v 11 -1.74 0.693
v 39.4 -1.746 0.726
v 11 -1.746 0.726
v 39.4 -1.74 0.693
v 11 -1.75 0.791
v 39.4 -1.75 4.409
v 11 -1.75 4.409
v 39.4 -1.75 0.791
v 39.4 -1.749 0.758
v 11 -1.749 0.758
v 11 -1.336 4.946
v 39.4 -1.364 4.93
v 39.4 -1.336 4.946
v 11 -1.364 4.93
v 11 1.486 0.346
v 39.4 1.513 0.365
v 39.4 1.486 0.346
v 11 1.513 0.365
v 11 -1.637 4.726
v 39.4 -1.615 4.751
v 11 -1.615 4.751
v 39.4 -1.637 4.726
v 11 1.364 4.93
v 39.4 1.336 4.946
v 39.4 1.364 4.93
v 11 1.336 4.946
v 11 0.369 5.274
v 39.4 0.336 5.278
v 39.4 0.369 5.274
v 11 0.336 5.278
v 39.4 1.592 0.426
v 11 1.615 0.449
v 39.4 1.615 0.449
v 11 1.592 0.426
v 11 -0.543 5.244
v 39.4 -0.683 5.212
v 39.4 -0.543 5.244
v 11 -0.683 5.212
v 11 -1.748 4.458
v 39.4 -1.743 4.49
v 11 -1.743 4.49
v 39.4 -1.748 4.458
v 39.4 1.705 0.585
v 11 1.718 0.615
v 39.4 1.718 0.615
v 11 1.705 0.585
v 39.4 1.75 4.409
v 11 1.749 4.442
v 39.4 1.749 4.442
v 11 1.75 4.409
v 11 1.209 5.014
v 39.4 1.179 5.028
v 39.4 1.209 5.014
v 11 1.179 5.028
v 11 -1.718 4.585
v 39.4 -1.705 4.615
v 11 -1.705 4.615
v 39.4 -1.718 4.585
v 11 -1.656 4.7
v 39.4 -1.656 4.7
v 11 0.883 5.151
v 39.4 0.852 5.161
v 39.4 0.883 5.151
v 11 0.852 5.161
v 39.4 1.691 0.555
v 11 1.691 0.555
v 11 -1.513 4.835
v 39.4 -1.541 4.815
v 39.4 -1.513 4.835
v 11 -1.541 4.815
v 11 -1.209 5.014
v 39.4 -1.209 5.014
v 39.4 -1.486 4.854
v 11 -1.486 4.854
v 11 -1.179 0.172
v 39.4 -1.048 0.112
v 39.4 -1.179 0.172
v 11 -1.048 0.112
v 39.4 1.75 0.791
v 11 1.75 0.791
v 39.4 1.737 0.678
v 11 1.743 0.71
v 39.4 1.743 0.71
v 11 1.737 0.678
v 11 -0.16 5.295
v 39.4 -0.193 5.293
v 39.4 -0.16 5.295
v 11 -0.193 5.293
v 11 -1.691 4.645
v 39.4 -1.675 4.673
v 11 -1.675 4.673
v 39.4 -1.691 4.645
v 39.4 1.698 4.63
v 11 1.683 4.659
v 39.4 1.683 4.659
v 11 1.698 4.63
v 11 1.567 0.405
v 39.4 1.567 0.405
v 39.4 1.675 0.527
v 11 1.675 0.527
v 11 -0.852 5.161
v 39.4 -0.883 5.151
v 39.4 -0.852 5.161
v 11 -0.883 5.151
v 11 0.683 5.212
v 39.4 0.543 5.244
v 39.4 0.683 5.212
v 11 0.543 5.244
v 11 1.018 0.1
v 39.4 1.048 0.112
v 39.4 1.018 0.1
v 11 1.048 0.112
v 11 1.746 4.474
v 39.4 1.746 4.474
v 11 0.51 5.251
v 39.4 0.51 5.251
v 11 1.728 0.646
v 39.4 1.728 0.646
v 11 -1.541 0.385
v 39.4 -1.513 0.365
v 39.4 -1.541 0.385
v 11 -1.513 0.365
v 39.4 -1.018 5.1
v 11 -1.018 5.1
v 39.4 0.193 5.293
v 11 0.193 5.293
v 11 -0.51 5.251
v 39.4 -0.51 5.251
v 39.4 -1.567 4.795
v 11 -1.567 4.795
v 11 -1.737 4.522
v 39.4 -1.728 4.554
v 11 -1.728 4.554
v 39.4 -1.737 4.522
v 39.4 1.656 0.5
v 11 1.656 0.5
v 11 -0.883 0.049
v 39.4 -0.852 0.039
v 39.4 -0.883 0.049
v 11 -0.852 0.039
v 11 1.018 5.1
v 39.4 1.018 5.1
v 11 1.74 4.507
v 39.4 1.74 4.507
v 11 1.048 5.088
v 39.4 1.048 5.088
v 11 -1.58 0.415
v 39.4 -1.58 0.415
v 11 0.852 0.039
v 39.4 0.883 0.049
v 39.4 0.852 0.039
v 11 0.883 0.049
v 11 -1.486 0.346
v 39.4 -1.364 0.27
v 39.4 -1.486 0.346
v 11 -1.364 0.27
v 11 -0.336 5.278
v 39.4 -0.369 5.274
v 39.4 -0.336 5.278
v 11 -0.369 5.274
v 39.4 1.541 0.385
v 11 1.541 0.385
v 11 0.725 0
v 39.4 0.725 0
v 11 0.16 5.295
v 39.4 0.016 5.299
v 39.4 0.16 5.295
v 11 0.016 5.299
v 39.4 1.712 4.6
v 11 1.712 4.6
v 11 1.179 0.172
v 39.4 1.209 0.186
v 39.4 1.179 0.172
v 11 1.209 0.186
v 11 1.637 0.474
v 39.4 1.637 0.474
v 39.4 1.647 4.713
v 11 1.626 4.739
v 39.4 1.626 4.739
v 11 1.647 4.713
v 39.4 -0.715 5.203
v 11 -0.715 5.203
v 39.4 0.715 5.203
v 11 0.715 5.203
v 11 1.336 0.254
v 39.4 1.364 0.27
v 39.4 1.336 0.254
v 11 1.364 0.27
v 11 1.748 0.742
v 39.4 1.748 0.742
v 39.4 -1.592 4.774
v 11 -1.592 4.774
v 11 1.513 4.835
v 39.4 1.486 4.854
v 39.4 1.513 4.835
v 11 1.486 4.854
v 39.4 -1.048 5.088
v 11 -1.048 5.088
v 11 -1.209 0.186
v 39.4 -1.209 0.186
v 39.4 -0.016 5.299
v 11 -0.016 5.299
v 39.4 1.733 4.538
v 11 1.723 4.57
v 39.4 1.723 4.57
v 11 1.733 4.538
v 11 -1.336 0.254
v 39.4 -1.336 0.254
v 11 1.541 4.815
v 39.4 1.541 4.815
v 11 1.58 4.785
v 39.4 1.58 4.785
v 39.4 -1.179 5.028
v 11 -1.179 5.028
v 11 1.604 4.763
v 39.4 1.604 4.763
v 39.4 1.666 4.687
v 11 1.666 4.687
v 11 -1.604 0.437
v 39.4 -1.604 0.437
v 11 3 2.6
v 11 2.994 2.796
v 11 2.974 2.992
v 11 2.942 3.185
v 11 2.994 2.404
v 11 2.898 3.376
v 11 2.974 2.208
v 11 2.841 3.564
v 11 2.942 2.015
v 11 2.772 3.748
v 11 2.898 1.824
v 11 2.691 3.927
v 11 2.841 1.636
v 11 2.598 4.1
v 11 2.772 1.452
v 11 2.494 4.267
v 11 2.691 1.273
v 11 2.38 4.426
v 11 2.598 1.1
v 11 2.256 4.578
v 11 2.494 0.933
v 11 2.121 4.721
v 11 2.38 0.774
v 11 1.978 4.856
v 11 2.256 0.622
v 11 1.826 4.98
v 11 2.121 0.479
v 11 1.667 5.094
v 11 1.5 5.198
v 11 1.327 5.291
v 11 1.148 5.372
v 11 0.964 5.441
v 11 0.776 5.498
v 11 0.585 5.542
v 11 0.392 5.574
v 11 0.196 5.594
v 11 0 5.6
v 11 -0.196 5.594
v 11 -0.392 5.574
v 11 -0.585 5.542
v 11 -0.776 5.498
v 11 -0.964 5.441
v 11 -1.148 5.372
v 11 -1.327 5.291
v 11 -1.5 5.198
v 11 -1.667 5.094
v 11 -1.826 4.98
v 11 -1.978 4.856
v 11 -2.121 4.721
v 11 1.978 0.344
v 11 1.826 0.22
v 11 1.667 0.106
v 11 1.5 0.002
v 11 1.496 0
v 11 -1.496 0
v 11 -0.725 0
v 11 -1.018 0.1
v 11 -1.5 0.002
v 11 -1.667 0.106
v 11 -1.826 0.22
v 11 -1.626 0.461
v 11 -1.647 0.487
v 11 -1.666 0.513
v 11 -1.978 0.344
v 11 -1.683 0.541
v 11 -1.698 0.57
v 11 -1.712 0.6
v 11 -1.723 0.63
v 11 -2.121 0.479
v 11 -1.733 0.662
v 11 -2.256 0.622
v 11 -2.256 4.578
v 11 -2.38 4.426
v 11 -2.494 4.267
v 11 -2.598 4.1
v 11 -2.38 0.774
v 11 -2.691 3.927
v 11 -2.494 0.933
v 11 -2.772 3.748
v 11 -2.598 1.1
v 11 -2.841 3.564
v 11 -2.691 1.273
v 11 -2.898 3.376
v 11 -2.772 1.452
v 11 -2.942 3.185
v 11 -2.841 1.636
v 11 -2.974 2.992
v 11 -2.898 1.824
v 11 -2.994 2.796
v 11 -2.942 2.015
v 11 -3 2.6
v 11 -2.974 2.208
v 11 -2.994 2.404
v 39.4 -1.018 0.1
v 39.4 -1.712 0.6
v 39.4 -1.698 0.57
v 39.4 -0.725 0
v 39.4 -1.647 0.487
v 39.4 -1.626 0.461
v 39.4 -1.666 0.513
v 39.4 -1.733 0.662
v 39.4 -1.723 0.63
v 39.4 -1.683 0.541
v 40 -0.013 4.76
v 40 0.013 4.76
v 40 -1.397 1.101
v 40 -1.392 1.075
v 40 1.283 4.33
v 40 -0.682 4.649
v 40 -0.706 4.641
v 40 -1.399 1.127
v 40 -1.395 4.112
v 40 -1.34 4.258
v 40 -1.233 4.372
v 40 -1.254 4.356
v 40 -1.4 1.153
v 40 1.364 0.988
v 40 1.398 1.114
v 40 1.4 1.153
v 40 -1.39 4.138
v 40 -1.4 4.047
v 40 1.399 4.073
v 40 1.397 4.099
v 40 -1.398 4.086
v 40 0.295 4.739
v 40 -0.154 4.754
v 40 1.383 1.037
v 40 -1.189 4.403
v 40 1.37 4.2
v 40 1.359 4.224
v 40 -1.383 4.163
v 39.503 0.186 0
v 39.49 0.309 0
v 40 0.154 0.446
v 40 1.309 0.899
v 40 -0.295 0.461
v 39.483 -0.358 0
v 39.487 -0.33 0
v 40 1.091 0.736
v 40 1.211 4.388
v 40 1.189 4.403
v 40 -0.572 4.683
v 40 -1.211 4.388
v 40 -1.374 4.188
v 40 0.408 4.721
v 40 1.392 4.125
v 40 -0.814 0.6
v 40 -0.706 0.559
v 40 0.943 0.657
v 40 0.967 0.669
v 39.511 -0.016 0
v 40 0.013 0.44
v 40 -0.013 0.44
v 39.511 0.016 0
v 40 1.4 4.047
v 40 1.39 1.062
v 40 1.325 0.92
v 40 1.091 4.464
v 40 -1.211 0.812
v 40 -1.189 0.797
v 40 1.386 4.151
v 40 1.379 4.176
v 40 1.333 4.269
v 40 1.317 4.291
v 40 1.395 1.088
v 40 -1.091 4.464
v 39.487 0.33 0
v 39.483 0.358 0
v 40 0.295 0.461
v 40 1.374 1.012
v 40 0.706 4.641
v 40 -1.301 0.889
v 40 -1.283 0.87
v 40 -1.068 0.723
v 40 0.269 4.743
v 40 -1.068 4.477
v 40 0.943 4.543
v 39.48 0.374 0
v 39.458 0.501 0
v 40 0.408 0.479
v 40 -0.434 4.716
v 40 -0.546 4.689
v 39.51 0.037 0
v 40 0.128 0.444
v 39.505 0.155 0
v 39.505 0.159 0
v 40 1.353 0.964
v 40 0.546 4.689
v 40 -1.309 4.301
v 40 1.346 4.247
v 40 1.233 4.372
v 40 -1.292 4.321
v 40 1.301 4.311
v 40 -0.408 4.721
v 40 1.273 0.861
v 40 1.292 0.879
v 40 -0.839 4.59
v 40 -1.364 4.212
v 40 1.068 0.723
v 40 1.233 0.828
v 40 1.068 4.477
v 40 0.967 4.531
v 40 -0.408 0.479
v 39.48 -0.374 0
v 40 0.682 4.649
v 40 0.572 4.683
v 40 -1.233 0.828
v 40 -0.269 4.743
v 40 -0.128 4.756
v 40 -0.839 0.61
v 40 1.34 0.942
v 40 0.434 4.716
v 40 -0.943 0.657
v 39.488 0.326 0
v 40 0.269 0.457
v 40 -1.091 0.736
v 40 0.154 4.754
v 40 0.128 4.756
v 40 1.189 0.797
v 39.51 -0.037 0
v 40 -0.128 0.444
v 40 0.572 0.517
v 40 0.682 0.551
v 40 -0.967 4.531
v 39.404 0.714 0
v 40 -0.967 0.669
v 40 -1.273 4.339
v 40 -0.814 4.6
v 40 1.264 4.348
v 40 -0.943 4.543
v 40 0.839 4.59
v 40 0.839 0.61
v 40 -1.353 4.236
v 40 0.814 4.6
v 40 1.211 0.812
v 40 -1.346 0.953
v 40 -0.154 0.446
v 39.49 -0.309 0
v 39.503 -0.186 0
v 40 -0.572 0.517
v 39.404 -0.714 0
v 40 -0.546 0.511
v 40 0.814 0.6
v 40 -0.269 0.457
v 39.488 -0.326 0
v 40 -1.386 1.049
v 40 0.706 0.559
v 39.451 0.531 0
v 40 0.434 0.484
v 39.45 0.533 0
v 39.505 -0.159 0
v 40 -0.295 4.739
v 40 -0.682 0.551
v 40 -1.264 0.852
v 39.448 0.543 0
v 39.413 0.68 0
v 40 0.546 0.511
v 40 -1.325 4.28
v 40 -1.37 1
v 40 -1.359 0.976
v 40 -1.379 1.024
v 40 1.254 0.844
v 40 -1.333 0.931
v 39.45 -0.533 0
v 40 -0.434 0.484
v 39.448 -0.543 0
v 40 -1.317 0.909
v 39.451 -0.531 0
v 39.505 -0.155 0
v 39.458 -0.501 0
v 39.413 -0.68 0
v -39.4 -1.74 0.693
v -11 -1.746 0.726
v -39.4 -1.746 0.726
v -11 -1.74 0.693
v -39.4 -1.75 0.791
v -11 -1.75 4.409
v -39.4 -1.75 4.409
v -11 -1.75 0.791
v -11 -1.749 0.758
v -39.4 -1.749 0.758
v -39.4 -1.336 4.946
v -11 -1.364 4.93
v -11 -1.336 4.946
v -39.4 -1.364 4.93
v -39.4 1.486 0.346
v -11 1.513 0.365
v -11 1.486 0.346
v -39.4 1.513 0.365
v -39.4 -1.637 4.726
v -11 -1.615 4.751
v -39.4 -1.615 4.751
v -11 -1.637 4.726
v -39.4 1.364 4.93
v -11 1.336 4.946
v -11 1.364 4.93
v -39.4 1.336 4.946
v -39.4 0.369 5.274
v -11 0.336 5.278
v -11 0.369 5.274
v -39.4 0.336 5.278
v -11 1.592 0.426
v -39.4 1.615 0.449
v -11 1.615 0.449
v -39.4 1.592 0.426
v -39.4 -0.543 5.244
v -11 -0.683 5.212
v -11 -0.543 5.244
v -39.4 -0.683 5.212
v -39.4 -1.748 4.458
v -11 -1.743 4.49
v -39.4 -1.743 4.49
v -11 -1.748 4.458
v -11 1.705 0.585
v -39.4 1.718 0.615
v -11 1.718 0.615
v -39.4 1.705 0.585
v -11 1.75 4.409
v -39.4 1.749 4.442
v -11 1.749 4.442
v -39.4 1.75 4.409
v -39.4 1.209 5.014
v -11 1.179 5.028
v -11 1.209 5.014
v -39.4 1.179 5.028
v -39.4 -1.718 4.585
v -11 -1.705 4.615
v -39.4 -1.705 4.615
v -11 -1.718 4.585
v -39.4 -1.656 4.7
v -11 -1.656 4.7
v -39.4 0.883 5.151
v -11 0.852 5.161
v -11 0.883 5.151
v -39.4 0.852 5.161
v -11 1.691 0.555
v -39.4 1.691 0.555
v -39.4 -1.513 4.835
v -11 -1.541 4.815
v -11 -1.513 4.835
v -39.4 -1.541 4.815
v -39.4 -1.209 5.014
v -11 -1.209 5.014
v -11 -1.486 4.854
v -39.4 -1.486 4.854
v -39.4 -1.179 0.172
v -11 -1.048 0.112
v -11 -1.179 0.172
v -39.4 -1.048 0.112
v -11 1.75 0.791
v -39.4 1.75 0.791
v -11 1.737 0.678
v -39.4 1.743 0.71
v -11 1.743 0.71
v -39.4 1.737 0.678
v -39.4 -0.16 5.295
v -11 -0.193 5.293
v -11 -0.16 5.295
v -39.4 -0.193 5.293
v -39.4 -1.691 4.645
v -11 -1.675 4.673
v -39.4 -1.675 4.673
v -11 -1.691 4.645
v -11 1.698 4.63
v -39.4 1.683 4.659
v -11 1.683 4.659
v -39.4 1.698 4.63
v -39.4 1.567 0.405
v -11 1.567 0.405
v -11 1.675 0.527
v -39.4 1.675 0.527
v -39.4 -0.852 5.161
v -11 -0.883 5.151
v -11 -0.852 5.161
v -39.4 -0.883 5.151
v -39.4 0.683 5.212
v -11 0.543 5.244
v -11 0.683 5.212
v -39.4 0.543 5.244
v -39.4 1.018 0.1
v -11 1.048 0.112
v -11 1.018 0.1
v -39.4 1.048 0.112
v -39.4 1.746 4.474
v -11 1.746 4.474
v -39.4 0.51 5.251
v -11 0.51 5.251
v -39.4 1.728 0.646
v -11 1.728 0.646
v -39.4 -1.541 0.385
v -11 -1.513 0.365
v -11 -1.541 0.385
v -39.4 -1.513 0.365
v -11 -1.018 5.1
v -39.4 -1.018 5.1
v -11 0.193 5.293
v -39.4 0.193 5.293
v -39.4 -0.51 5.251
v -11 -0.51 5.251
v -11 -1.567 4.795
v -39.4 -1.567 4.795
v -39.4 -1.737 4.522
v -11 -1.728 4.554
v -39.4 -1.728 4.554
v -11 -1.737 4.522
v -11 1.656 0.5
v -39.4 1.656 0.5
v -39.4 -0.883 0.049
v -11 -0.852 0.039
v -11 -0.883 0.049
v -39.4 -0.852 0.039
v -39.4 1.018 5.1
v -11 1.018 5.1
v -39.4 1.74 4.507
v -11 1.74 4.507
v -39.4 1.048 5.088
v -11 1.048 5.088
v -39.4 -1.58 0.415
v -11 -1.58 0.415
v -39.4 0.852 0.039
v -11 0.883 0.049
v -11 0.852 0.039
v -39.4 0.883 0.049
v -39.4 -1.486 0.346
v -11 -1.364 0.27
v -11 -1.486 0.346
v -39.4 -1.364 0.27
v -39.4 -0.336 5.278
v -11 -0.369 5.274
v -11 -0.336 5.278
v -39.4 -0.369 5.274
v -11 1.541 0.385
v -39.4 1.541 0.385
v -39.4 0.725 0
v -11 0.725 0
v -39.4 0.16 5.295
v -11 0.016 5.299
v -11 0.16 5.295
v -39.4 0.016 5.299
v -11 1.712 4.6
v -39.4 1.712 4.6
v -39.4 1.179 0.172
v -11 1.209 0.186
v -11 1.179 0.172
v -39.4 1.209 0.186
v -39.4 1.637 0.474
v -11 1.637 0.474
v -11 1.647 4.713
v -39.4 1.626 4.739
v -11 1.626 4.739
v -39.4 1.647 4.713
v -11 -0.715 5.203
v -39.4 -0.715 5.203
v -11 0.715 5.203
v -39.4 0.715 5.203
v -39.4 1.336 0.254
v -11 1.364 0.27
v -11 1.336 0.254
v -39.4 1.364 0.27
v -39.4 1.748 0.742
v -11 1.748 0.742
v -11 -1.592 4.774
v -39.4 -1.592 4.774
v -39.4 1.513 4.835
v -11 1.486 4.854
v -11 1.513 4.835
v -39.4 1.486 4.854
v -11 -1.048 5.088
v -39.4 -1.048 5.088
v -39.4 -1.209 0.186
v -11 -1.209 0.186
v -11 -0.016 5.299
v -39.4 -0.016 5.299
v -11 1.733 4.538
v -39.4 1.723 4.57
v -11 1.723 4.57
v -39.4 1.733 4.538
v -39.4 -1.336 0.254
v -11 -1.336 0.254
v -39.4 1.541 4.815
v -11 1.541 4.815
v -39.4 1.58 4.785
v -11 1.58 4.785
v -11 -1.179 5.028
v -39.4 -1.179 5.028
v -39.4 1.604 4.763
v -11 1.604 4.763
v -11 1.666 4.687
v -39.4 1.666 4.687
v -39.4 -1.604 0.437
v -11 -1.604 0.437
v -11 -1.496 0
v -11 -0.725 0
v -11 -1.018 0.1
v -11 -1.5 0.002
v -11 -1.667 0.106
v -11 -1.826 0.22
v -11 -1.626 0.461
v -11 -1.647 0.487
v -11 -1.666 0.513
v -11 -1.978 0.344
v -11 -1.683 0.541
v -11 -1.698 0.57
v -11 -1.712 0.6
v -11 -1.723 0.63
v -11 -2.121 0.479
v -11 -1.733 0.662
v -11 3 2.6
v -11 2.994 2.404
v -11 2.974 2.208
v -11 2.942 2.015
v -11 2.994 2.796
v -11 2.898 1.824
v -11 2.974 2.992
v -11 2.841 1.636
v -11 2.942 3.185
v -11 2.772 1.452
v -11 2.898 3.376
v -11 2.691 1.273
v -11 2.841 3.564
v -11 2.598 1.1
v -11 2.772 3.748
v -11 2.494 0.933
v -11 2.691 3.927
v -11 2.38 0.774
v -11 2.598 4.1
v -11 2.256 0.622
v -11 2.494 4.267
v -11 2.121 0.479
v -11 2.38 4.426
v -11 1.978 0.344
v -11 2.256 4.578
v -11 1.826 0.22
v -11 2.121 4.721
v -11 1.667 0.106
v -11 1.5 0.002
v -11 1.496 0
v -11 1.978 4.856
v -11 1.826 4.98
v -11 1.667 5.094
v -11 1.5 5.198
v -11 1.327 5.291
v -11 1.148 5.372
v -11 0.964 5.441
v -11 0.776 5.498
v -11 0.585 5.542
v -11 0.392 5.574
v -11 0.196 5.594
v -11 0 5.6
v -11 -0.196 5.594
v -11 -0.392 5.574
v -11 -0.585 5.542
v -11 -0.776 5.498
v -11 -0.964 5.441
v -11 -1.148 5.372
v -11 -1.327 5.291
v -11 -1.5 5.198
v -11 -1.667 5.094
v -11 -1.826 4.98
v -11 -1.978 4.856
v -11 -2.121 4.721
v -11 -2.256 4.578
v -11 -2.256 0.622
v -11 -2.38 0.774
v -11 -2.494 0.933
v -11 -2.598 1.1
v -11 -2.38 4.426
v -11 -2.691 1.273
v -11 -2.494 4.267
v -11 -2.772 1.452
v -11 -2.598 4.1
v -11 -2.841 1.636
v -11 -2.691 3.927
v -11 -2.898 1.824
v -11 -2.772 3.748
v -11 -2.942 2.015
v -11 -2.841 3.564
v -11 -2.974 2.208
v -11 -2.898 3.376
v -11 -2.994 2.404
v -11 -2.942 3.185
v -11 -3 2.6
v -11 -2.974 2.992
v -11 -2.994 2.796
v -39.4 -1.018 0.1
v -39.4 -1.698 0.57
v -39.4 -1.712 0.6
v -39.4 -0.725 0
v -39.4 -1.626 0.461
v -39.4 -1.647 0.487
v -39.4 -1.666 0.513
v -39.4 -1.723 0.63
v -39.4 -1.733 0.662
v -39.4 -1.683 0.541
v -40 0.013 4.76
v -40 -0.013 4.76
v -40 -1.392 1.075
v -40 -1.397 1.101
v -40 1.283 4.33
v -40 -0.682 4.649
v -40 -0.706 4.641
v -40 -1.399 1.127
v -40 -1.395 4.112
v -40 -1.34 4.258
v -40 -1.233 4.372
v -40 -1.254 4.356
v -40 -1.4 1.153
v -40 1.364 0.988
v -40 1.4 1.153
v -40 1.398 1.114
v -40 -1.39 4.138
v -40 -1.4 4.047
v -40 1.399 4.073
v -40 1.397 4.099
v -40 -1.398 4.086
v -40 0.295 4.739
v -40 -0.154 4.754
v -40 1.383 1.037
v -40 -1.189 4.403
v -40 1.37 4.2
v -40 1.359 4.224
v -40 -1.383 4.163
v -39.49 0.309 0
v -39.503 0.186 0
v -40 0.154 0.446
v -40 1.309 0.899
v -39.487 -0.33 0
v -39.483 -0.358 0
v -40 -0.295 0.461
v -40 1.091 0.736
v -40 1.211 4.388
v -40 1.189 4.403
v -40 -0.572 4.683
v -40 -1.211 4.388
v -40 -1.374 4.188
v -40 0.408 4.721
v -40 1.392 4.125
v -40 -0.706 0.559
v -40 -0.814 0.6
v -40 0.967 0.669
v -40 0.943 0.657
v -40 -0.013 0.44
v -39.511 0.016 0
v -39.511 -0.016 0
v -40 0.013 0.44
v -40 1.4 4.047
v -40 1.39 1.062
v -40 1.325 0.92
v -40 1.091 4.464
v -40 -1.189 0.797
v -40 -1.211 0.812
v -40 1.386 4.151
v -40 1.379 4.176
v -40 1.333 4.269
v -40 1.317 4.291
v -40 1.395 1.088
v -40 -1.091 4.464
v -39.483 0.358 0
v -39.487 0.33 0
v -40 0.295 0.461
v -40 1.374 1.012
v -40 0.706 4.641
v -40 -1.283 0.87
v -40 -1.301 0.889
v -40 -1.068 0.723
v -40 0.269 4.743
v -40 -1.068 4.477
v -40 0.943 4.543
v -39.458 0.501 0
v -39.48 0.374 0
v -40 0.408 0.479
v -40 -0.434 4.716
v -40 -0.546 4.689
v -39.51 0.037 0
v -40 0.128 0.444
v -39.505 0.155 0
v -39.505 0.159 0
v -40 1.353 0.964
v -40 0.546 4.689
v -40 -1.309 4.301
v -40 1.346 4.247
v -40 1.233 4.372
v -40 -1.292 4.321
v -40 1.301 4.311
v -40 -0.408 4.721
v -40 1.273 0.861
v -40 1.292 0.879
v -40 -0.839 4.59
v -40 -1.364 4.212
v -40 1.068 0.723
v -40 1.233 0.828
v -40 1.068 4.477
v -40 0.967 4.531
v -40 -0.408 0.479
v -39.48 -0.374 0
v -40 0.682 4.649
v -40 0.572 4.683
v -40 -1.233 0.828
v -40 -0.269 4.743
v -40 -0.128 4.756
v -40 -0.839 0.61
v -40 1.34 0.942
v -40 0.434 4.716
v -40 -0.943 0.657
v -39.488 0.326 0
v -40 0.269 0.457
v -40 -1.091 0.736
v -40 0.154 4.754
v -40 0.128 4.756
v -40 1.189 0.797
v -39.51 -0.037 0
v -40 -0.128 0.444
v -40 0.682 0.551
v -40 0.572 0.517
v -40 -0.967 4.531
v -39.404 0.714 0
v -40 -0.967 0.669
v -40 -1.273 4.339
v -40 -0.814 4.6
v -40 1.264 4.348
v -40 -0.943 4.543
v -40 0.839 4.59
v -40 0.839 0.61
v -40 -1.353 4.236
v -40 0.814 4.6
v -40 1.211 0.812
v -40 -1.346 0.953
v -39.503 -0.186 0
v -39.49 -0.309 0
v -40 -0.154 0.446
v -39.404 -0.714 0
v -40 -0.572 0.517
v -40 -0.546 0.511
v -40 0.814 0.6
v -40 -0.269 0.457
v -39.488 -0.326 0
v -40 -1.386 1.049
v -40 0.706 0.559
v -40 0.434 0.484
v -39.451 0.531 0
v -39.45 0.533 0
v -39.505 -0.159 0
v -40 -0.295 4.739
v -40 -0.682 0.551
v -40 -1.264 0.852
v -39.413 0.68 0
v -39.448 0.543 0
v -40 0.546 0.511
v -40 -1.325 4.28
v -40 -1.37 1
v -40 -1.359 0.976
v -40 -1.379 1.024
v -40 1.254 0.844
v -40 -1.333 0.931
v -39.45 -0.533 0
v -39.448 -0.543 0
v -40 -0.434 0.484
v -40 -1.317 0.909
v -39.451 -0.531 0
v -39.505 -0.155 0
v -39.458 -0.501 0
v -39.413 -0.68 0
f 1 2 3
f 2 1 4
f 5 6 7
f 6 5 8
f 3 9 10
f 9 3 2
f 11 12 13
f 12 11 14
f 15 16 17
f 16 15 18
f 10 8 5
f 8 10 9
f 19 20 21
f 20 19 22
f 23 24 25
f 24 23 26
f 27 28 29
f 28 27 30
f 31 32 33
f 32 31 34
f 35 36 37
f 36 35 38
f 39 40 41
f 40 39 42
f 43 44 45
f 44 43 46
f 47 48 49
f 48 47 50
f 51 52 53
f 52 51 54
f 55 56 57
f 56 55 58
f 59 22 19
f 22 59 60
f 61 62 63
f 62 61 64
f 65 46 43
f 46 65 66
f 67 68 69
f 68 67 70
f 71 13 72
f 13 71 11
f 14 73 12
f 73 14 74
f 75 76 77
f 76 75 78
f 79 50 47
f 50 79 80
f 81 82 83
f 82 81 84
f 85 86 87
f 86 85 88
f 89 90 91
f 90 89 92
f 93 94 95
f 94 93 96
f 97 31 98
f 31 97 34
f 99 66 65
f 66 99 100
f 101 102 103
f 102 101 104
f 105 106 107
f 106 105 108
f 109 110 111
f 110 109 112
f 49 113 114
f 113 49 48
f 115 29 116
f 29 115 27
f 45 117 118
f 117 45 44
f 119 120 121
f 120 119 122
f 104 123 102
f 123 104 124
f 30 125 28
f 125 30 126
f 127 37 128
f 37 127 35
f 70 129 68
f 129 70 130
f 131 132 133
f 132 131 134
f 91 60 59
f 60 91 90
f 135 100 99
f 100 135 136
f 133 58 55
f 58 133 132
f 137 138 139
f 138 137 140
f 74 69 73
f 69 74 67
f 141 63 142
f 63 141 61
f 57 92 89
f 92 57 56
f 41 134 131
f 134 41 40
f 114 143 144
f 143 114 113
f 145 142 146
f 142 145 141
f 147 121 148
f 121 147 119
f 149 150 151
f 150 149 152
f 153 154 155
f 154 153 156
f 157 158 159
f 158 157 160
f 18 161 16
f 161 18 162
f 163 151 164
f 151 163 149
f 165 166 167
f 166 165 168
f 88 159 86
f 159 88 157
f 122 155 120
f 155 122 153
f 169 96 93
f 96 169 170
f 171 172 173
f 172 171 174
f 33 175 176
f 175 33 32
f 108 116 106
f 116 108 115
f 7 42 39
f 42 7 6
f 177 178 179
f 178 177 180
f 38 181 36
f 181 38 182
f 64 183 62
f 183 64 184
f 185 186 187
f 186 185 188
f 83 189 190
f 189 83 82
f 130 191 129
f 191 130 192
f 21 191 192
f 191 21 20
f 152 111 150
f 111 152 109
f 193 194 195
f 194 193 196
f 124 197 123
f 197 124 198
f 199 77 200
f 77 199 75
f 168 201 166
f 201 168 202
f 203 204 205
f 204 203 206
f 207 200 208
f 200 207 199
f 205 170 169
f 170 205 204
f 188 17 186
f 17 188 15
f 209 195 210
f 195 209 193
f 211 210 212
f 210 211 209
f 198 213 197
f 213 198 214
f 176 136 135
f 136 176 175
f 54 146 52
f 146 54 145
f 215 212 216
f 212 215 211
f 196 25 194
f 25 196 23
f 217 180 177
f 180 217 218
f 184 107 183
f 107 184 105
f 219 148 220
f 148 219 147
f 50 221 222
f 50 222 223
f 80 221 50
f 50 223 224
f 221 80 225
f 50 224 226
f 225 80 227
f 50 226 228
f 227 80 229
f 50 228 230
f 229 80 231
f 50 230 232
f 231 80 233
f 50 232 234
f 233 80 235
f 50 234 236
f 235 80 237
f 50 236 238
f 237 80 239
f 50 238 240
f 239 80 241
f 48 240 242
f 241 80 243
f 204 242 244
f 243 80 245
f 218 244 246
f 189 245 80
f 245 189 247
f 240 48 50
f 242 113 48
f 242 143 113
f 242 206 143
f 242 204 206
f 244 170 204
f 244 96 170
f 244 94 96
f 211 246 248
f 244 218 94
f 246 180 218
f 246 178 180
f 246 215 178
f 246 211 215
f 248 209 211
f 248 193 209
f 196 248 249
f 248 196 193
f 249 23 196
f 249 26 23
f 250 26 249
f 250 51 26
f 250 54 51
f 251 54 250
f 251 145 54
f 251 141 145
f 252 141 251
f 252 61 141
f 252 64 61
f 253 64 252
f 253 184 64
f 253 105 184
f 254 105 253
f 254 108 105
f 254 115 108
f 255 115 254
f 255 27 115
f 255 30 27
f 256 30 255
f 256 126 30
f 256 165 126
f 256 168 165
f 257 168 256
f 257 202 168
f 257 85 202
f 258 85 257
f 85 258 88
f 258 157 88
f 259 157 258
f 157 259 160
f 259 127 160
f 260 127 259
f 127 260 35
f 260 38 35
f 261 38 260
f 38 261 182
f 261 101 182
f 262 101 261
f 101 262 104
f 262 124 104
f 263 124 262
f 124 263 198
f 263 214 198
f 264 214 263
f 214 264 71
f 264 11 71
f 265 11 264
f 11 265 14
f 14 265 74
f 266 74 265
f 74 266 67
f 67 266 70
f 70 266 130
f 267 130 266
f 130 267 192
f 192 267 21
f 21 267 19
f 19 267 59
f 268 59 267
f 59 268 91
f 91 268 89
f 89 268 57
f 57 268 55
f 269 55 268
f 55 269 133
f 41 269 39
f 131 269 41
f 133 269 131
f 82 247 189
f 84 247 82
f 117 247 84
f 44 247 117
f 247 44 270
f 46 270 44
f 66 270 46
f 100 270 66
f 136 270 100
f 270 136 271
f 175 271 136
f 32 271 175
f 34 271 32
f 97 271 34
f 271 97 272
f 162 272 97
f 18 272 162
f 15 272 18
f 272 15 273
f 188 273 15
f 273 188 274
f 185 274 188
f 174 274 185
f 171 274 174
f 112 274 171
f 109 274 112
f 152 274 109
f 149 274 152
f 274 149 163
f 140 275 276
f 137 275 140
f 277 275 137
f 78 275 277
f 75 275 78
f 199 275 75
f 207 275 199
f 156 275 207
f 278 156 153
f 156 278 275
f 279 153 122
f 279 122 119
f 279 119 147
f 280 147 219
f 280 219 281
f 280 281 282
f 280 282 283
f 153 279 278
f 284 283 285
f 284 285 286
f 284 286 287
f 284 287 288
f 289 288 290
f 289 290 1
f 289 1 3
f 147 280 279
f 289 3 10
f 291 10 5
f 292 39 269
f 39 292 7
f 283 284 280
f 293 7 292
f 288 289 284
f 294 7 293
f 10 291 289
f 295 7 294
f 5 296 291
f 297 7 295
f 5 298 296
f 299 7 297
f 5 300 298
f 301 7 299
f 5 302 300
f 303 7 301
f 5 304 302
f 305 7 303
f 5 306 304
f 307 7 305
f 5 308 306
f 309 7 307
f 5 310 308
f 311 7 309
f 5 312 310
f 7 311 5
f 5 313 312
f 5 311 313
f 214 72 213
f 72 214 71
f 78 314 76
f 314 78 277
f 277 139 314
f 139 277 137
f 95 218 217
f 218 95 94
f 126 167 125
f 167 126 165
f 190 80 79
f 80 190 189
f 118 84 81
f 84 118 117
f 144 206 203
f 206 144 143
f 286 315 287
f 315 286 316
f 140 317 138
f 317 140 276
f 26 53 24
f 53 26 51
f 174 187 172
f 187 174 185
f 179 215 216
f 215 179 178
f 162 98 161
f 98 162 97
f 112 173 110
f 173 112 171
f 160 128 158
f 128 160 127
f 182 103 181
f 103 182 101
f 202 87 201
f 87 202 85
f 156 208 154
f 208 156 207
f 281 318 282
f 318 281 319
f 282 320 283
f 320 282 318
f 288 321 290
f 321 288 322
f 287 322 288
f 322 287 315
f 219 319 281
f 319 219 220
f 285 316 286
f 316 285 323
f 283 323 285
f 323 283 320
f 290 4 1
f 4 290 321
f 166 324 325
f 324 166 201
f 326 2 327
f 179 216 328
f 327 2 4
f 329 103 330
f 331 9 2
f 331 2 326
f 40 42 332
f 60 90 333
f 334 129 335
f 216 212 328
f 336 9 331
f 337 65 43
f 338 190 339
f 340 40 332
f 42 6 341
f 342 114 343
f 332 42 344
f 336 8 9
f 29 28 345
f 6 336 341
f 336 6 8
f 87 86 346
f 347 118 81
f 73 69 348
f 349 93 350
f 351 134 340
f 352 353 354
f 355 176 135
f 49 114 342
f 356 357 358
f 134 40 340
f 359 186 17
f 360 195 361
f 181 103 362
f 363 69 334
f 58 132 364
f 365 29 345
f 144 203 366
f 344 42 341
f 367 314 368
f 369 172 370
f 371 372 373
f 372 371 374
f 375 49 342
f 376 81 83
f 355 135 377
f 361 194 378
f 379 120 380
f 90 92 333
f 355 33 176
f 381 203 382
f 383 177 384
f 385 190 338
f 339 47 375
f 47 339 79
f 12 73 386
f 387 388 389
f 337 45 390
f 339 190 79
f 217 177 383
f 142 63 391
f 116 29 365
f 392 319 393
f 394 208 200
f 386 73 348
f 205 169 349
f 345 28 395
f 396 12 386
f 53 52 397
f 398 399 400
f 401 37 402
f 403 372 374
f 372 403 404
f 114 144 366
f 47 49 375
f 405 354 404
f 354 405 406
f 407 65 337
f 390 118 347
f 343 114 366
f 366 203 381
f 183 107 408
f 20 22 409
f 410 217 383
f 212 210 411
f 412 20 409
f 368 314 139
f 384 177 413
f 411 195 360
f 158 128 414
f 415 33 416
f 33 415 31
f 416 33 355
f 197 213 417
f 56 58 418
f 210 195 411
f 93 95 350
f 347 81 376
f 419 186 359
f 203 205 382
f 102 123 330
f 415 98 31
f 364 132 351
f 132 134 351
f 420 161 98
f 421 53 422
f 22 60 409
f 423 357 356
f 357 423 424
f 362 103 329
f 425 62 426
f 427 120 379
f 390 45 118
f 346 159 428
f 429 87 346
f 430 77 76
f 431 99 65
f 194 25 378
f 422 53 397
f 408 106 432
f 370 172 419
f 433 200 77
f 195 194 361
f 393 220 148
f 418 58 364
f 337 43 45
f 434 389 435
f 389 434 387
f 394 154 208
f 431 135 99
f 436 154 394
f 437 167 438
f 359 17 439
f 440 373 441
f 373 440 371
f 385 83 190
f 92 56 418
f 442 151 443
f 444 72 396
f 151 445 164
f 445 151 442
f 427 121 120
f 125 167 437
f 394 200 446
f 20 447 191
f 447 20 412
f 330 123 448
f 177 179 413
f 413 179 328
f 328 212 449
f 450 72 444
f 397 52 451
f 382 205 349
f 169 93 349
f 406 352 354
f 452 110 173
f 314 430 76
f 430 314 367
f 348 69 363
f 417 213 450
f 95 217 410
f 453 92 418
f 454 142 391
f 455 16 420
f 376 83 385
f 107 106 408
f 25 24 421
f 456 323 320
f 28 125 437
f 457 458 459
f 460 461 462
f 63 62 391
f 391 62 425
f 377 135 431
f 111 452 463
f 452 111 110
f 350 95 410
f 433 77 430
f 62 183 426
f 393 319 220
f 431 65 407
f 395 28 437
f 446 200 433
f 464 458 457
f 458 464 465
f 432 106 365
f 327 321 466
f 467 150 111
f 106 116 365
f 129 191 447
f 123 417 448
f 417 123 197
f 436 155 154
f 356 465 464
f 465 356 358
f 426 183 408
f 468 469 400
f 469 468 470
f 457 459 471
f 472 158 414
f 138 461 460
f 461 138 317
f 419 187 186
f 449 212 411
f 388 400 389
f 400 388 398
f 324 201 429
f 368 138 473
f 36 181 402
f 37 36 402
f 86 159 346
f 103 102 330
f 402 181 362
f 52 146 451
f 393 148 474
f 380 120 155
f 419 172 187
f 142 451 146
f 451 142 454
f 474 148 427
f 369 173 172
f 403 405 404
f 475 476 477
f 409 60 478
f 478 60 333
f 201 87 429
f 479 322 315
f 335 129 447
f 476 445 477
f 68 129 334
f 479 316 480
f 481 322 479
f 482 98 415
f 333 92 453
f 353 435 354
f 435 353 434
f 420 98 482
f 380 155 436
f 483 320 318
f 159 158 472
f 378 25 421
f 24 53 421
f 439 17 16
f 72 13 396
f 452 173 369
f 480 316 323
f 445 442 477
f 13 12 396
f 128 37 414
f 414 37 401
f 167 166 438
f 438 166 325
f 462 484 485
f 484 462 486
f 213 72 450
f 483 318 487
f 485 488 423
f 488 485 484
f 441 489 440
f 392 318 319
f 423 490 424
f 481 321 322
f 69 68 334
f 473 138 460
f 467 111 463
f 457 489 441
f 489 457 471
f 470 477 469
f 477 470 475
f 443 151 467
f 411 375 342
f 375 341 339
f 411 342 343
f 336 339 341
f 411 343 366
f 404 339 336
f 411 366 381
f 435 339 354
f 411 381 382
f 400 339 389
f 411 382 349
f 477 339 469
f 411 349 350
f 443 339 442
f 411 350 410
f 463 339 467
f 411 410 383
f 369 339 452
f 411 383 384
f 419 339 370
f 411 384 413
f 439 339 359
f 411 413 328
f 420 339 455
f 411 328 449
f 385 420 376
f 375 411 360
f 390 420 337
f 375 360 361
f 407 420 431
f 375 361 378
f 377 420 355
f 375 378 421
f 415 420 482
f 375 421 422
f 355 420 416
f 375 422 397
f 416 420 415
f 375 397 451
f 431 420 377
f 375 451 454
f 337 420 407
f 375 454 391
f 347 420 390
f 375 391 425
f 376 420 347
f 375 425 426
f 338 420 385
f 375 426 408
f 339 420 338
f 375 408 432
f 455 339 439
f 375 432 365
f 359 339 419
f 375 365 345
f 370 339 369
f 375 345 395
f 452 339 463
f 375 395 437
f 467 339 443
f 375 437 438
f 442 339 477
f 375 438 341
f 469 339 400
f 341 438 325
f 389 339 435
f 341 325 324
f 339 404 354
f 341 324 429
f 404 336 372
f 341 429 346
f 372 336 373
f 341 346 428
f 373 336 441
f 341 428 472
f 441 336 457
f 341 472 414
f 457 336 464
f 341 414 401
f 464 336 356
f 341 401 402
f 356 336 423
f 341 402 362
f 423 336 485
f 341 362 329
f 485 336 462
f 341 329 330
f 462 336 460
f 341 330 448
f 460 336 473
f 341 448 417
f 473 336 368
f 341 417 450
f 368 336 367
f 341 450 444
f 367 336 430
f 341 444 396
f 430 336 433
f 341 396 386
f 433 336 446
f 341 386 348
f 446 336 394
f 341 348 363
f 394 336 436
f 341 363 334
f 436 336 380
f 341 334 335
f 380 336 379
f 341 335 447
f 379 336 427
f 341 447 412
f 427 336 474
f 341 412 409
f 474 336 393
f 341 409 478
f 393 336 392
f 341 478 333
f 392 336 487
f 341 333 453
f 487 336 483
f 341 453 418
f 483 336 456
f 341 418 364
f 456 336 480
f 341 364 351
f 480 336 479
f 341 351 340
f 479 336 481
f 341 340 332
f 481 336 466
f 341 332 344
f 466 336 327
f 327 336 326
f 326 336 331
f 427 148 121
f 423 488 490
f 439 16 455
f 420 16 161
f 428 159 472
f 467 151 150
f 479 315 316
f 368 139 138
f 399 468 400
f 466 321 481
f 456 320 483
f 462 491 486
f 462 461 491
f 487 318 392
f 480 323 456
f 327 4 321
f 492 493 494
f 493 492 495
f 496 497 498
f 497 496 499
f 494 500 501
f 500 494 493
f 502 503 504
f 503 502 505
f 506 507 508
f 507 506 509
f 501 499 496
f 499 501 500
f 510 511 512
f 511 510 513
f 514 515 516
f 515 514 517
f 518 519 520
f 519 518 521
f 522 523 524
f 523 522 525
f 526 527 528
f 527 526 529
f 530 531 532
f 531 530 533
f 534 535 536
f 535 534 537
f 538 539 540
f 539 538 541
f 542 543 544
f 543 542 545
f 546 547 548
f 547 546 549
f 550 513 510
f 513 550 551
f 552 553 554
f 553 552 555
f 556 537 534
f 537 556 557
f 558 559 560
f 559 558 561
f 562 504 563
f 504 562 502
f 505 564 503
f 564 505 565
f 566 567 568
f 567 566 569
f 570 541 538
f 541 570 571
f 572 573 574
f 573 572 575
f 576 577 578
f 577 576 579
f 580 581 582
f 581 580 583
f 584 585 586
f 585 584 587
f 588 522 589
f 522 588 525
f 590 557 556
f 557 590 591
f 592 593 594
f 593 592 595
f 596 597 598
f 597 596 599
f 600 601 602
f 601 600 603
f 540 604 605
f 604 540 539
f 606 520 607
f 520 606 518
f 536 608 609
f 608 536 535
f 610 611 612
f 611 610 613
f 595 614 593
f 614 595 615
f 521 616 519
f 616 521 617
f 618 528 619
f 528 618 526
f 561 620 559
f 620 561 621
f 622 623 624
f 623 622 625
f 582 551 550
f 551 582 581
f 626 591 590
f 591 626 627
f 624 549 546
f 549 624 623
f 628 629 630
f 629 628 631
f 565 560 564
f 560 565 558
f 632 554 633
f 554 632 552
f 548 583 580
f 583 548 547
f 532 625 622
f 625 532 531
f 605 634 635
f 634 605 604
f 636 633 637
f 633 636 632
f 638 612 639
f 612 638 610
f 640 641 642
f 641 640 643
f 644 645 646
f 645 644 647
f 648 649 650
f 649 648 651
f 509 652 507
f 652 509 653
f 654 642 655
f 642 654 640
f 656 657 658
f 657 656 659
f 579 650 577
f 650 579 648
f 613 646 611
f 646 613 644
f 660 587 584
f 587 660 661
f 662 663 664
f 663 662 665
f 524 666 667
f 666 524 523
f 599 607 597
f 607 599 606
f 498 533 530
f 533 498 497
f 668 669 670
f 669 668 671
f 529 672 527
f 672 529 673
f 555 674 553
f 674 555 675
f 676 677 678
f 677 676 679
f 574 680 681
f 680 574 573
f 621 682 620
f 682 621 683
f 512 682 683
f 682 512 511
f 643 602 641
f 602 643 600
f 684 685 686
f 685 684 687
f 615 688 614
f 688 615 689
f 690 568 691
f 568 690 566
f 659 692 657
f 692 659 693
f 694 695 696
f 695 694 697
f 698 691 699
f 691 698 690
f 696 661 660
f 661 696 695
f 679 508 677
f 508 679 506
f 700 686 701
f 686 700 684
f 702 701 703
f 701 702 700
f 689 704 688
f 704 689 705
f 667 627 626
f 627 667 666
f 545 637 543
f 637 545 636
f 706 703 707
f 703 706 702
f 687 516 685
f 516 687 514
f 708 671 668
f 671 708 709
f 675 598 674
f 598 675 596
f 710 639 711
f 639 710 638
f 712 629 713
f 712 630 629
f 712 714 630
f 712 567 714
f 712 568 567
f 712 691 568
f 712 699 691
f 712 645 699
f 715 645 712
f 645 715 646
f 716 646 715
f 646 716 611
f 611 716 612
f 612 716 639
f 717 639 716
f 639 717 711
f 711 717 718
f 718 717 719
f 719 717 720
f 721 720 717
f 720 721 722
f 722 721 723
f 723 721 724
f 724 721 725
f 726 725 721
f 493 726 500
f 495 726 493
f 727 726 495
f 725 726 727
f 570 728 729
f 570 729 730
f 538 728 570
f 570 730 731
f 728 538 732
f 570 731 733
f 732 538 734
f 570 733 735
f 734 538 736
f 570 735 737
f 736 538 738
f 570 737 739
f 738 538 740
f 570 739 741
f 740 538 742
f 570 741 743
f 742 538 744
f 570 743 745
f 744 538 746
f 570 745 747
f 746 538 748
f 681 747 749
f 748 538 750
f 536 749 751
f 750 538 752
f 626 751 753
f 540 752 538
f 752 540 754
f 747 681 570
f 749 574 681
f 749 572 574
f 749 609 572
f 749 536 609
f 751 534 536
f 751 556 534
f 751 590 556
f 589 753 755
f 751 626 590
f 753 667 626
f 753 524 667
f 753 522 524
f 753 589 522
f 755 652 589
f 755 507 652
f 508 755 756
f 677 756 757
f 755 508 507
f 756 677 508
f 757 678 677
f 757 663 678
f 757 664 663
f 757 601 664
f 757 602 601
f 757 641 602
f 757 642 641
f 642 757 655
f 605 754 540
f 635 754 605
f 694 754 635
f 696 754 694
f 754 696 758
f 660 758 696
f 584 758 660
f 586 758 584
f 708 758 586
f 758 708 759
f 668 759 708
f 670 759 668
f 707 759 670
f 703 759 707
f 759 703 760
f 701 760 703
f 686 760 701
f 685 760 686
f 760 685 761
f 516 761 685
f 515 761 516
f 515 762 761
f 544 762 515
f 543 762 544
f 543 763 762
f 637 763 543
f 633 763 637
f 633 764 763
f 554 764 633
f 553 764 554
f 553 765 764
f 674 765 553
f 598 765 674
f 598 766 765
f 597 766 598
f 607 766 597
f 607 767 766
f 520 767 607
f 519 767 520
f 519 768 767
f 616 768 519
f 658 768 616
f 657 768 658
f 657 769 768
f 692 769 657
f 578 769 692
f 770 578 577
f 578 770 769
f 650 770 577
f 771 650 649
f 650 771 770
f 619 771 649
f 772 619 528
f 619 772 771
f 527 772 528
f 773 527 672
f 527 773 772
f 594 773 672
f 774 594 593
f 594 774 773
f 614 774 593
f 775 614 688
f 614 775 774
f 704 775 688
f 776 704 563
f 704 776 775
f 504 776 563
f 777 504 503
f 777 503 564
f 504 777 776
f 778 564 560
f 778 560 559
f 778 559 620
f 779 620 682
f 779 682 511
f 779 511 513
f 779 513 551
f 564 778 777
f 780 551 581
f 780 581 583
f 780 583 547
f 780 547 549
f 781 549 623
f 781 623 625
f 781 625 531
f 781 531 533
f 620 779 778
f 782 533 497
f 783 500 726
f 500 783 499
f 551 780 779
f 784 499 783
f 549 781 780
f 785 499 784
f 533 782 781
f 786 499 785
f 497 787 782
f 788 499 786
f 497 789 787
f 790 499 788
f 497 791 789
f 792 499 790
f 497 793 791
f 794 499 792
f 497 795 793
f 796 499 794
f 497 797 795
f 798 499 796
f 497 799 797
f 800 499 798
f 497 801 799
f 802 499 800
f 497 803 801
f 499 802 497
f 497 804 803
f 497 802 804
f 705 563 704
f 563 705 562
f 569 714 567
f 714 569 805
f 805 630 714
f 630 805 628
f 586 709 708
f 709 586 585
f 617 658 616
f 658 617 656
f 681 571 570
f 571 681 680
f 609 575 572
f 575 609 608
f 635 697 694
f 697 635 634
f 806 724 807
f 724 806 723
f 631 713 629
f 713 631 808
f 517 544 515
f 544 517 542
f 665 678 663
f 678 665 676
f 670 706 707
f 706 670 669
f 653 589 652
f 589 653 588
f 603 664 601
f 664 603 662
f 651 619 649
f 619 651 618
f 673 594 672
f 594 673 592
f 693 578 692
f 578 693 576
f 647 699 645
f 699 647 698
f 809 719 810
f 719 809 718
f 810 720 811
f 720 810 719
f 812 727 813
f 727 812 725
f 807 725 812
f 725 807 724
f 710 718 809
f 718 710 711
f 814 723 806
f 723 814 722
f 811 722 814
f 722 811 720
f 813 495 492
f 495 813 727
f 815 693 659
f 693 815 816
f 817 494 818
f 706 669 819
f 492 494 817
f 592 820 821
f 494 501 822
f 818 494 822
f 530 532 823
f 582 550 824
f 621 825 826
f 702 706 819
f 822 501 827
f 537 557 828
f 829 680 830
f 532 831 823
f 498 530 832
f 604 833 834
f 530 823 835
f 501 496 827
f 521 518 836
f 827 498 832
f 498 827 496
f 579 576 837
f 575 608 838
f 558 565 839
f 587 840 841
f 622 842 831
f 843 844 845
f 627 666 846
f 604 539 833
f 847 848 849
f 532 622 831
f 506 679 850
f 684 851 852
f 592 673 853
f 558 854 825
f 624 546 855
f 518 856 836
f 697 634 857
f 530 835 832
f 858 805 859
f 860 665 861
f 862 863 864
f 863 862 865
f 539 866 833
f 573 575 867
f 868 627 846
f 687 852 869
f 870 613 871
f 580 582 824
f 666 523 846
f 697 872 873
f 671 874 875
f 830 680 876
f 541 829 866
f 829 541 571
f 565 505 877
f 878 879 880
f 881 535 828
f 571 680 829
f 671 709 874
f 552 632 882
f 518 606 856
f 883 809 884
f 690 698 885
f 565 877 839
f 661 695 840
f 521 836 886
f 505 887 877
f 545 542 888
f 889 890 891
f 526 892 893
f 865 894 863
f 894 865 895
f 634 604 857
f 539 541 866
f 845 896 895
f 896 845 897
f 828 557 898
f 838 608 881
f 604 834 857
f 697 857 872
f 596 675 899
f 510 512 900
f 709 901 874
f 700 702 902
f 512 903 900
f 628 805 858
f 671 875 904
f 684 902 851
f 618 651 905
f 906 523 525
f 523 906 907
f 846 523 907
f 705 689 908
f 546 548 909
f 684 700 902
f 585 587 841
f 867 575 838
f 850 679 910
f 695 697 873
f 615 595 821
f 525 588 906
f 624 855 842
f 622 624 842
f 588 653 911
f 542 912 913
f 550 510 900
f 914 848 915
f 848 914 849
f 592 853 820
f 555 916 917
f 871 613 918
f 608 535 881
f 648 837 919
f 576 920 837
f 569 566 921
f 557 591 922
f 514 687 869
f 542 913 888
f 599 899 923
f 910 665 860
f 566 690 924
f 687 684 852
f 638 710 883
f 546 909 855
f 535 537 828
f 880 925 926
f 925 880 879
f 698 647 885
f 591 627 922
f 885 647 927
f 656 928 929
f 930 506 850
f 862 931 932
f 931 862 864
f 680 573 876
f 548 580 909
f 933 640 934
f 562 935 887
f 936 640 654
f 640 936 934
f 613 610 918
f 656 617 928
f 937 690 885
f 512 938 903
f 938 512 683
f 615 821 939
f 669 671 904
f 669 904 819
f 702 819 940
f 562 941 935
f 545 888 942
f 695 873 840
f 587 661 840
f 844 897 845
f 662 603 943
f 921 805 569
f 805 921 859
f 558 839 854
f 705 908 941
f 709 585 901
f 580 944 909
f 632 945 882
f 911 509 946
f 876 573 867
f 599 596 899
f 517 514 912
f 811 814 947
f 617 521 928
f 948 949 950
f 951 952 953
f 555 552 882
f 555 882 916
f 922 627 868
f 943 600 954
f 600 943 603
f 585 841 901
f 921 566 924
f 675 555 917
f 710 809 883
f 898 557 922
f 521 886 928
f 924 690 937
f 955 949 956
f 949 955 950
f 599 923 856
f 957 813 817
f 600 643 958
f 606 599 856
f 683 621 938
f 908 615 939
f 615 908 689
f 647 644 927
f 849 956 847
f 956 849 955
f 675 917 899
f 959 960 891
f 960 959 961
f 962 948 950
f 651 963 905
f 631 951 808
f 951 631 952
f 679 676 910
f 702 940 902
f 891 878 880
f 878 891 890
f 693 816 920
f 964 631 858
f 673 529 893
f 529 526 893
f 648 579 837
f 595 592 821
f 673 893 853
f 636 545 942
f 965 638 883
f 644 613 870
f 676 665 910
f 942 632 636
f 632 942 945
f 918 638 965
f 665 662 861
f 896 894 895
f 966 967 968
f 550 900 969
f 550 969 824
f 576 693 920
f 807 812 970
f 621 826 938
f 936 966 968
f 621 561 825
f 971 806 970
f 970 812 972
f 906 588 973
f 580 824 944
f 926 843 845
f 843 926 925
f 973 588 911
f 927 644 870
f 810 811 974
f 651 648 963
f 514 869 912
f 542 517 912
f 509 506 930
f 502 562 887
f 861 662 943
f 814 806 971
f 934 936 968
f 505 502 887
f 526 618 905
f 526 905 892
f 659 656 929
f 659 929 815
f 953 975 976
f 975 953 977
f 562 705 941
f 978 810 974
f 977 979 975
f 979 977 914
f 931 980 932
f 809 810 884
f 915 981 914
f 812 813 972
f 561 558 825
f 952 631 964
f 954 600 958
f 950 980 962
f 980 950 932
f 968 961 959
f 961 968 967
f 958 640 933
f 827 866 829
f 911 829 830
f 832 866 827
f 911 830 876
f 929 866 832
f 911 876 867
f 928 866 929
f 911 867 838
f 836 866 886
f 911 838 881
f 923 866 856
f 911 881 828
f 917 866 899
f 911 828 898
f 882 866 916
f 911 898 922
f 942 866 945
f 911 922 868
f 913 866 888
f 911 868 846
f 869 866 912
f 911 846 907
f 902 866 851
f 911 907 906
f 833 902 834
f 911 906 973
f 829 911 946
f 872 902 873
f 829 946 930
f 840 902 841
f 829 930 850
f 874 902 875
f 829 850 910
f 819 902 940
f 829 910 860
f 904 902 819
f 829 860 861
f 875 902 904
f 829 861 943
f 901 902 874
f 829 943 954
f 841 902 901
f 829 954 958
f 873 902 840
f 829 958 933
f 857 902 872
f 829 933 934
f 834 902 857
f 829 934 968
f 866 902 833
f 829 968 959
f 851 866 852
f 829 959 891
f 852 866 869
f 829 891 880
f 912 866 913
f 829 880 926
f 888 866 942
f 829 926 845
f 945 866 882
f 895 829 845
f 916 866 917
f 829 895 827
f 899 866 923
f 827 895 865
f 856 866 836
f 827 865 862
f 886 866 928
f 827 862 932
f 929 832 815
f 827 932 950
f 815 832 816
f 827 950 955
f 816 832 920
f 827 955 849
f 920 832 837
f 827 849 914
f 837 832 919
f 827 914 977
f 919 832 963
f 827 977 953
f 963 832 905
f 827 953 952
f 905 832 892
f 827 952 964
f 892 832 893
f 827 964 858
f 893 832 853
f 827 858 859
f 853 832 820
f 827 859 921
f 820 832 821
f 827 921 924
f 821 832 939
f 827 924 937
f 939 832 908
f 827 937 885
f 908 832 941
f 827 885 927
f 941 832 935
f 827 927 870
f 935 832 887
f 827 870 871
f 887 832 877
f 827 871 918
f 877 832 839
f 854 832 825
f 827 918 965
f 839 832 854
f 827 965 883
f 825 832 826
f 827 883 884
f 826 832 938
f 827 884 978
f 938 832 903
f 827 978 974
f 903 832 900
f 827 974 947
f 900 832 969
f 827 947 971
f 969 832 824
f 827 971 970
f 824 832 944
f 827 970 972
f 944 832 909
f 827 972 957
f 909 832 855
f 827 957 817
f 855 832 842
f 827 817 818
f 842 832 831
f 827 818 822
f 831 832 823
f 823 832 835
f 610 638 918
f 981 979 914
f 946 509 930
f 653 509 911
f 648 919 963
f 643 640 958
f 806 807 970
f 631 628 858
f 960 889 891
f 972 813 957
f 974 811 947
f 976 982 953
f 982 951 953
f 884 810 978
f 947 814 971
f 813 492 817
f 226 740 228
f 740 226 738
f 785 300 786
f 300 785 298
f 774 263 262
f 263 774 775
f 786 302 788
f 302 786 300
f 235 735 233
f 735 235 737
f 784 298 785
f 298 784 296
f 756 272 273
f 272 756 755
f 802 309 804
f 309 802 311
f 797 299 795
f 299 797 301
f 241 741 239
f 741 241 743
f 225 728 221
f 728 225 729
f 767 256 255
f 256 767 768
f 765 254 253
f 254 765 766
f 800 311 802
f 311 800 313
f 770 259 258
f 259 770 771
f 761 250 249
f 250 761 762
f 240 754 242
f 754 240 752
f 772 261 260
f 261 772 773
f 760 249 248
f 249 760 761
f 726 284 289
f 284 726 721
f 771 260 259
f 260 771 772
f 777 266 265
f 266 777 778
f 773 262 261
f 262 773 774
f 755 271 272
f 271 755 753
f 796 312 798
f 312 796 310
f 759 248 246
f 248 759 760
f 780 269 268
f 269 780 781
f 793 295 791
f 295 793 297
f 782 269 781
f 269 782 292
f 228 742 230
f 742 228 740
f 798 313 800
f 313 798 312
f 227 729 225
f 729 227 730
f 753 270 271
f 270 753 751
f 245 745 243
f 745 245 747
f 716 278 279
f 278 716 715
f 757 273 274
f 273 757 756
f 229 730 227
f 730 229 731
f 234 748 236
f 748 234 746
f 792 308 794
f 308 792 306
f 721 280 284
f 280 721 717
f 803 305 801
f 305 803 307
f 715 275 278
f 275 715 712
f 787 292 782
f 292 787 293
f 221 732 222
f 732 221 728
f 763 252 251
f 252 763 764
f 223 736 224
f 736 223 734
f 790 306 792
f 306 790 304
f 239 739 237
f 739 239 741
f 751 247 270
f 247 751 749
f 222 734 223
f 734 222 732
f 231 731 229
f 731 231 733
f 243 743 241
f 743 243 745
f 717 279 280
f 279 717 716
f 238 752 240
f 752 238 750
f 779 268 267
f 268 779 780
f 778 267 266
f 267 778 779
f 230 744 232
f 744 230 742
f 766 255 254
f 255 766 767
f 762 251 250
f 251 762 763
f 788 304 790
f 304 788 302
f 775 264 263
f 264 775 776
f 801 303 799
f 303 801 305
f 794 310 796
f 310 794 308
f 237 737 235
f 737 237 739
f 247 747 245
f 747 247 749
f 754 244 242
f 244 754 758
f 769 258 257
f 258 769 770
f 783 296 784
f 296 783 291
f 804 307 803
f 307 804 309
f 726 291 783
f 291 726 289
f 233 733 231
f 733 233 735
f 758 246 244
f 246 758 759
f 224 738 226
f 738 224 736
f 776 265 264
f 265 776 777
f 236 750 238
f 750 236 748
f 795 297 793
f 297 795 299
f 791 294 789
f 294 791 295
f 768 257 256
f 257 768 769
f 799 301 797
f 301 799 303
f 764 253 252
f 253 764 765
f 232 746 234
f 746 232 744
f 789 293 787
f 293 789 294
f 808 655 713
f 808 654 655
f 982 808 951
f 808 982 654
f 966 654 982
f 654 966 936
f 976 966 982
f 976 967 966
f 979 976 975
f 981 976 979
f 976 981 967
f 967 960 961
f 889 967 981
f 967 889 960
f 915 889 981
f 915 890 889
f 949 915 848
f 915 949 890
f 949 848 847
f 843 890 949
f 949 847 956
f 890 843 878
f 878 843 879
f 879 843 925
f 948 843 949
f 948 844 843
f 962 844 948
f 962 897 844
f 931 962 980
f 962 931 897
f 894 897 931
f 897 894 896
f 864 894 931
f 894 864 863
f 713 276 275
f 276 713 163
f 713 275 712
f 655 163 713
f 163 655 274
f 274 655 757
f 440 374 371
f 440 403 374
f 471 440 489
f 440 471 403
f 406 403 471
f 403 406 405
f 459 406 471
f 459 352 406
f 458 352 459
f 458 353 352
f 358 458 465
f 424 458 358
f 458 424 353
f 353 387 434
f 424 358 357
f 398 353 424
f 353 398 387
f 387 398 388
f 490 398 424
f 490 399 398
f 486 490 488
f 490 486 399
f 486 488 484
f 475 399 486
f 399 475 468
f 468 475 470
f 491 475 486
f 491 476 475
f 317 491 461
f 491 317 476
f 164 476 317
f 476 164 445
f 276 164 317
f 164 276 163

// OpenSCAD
// ======================================================================
//  ДОВГА ВІСЬ НА ДВА КОЛЕСА · sosny · Т-150
//
//  Як wheel_axle_round.scad (v5), але D-кінці з ОБОХ боків:
//     колесо | D-кінець 29 | шайба | вал Ø6 у тримачі | шайба | D-кінець 29 | колесо
//  Вал крутиться в отворі Ø6.5 тримача axle_holder.scad (звужений, 18.4 мм).
//  Шайби окремі (2 шт): вісь просовується крізь тримач, надягаються шайби,
//  потім колеса натискаються на D-кінці і тримають усе разом.
//
//  Друк ЛЕЖАЧИ (так вісь у рази міцніша на згин, ніж стоячи):
//  PLA 0.2, 4 стінки, 100 %, без підтримок, лиски D-кінців дивляться вбік.
//  Знизу зрізано 0.4 мм, щоб вісь не котилась по столу.
// ======================================================================

part = "axle";     // "axle" | "washer" | "all"

// --- D-кінець під маточину колеса (як у v5, що добре сів) ---
hub_d    = 5.4;    // круглий діаметр
hub_flat = 3.5;    // між лисками
corner_r = 0.5;
hub_len  = 29;     // довжина D-кінця з кожного боку

// --- вал між колесами ---
ax_d     = 6;      // отвір тримача Ø6.5
holder_w = 18.4;   // товщина тримача (block_y у axle_holder.scad)
washer_t = 1.5;  washer_d = 10;  washer_fit = 0.2;
play     = 0.6;    // осьовий люфт
shaft_len = holder_w + 2*washer_t + play;   // 22.0 — між маточинами коліс

flat_cut = 0.4;    // зріз знизу для друку лежачи
$fn = 96;

total = 2*hub_len + shaft_len;
echo(str("Довжина осі: ", total, " мм; між колесами: ", shaft_len, " мм"));

module d_profile() {
    offset(r = corner_r) offset(delta = -corner_r)
        intersection() { circle(d = hub_d); square([hub_d + 1, hub_flat], center = true); }
}

module d_end() {   // уздовж +x, з фаскою на кінці
    rotate([0, 90, 0]) {
        linear_extrude(hub_len - 0.6) d_profile();
        translate([0, 0, hub_len - 0.6]) linear_extrude(0.6, scale = 0.8) d_profile();
    }
}

module axle() {
    difference() {
        union() {
            translate([-shaft_len/2, 0, 0]) rotate([0, 90, 0]) cylinder(d = ax_d, h = shaft_len);
            translate([ shaft_len/2, 0, 0]) d_end();
            translate([-shaft_len/2, 0, 0]) mirror([1, 0, 0]) d_end();
        }
        translate([-total, -10, -ax_d/2 - 10 + flat_cut]) cube([2*total, 20, 10]);
    }
}

module washer() {
    difference() {
        cylinder(d = washer_d, h = washer_t);
        translate([0, 0, -1]) cylinder(d = ax_d + washer_fit, h = washer_t + 2);
    }
}

if (part == "axle")   translate([0, 0, ax_d/2 - flat_cut]) axle();
if (part == "washer") washer();
if (part == "all") {
    translate([0, 0, ax_d/2 - flat_cut]) axle();
    for (i = [0, 1]) translate([-8 + 16*i, 14, 0]) washer();
}
